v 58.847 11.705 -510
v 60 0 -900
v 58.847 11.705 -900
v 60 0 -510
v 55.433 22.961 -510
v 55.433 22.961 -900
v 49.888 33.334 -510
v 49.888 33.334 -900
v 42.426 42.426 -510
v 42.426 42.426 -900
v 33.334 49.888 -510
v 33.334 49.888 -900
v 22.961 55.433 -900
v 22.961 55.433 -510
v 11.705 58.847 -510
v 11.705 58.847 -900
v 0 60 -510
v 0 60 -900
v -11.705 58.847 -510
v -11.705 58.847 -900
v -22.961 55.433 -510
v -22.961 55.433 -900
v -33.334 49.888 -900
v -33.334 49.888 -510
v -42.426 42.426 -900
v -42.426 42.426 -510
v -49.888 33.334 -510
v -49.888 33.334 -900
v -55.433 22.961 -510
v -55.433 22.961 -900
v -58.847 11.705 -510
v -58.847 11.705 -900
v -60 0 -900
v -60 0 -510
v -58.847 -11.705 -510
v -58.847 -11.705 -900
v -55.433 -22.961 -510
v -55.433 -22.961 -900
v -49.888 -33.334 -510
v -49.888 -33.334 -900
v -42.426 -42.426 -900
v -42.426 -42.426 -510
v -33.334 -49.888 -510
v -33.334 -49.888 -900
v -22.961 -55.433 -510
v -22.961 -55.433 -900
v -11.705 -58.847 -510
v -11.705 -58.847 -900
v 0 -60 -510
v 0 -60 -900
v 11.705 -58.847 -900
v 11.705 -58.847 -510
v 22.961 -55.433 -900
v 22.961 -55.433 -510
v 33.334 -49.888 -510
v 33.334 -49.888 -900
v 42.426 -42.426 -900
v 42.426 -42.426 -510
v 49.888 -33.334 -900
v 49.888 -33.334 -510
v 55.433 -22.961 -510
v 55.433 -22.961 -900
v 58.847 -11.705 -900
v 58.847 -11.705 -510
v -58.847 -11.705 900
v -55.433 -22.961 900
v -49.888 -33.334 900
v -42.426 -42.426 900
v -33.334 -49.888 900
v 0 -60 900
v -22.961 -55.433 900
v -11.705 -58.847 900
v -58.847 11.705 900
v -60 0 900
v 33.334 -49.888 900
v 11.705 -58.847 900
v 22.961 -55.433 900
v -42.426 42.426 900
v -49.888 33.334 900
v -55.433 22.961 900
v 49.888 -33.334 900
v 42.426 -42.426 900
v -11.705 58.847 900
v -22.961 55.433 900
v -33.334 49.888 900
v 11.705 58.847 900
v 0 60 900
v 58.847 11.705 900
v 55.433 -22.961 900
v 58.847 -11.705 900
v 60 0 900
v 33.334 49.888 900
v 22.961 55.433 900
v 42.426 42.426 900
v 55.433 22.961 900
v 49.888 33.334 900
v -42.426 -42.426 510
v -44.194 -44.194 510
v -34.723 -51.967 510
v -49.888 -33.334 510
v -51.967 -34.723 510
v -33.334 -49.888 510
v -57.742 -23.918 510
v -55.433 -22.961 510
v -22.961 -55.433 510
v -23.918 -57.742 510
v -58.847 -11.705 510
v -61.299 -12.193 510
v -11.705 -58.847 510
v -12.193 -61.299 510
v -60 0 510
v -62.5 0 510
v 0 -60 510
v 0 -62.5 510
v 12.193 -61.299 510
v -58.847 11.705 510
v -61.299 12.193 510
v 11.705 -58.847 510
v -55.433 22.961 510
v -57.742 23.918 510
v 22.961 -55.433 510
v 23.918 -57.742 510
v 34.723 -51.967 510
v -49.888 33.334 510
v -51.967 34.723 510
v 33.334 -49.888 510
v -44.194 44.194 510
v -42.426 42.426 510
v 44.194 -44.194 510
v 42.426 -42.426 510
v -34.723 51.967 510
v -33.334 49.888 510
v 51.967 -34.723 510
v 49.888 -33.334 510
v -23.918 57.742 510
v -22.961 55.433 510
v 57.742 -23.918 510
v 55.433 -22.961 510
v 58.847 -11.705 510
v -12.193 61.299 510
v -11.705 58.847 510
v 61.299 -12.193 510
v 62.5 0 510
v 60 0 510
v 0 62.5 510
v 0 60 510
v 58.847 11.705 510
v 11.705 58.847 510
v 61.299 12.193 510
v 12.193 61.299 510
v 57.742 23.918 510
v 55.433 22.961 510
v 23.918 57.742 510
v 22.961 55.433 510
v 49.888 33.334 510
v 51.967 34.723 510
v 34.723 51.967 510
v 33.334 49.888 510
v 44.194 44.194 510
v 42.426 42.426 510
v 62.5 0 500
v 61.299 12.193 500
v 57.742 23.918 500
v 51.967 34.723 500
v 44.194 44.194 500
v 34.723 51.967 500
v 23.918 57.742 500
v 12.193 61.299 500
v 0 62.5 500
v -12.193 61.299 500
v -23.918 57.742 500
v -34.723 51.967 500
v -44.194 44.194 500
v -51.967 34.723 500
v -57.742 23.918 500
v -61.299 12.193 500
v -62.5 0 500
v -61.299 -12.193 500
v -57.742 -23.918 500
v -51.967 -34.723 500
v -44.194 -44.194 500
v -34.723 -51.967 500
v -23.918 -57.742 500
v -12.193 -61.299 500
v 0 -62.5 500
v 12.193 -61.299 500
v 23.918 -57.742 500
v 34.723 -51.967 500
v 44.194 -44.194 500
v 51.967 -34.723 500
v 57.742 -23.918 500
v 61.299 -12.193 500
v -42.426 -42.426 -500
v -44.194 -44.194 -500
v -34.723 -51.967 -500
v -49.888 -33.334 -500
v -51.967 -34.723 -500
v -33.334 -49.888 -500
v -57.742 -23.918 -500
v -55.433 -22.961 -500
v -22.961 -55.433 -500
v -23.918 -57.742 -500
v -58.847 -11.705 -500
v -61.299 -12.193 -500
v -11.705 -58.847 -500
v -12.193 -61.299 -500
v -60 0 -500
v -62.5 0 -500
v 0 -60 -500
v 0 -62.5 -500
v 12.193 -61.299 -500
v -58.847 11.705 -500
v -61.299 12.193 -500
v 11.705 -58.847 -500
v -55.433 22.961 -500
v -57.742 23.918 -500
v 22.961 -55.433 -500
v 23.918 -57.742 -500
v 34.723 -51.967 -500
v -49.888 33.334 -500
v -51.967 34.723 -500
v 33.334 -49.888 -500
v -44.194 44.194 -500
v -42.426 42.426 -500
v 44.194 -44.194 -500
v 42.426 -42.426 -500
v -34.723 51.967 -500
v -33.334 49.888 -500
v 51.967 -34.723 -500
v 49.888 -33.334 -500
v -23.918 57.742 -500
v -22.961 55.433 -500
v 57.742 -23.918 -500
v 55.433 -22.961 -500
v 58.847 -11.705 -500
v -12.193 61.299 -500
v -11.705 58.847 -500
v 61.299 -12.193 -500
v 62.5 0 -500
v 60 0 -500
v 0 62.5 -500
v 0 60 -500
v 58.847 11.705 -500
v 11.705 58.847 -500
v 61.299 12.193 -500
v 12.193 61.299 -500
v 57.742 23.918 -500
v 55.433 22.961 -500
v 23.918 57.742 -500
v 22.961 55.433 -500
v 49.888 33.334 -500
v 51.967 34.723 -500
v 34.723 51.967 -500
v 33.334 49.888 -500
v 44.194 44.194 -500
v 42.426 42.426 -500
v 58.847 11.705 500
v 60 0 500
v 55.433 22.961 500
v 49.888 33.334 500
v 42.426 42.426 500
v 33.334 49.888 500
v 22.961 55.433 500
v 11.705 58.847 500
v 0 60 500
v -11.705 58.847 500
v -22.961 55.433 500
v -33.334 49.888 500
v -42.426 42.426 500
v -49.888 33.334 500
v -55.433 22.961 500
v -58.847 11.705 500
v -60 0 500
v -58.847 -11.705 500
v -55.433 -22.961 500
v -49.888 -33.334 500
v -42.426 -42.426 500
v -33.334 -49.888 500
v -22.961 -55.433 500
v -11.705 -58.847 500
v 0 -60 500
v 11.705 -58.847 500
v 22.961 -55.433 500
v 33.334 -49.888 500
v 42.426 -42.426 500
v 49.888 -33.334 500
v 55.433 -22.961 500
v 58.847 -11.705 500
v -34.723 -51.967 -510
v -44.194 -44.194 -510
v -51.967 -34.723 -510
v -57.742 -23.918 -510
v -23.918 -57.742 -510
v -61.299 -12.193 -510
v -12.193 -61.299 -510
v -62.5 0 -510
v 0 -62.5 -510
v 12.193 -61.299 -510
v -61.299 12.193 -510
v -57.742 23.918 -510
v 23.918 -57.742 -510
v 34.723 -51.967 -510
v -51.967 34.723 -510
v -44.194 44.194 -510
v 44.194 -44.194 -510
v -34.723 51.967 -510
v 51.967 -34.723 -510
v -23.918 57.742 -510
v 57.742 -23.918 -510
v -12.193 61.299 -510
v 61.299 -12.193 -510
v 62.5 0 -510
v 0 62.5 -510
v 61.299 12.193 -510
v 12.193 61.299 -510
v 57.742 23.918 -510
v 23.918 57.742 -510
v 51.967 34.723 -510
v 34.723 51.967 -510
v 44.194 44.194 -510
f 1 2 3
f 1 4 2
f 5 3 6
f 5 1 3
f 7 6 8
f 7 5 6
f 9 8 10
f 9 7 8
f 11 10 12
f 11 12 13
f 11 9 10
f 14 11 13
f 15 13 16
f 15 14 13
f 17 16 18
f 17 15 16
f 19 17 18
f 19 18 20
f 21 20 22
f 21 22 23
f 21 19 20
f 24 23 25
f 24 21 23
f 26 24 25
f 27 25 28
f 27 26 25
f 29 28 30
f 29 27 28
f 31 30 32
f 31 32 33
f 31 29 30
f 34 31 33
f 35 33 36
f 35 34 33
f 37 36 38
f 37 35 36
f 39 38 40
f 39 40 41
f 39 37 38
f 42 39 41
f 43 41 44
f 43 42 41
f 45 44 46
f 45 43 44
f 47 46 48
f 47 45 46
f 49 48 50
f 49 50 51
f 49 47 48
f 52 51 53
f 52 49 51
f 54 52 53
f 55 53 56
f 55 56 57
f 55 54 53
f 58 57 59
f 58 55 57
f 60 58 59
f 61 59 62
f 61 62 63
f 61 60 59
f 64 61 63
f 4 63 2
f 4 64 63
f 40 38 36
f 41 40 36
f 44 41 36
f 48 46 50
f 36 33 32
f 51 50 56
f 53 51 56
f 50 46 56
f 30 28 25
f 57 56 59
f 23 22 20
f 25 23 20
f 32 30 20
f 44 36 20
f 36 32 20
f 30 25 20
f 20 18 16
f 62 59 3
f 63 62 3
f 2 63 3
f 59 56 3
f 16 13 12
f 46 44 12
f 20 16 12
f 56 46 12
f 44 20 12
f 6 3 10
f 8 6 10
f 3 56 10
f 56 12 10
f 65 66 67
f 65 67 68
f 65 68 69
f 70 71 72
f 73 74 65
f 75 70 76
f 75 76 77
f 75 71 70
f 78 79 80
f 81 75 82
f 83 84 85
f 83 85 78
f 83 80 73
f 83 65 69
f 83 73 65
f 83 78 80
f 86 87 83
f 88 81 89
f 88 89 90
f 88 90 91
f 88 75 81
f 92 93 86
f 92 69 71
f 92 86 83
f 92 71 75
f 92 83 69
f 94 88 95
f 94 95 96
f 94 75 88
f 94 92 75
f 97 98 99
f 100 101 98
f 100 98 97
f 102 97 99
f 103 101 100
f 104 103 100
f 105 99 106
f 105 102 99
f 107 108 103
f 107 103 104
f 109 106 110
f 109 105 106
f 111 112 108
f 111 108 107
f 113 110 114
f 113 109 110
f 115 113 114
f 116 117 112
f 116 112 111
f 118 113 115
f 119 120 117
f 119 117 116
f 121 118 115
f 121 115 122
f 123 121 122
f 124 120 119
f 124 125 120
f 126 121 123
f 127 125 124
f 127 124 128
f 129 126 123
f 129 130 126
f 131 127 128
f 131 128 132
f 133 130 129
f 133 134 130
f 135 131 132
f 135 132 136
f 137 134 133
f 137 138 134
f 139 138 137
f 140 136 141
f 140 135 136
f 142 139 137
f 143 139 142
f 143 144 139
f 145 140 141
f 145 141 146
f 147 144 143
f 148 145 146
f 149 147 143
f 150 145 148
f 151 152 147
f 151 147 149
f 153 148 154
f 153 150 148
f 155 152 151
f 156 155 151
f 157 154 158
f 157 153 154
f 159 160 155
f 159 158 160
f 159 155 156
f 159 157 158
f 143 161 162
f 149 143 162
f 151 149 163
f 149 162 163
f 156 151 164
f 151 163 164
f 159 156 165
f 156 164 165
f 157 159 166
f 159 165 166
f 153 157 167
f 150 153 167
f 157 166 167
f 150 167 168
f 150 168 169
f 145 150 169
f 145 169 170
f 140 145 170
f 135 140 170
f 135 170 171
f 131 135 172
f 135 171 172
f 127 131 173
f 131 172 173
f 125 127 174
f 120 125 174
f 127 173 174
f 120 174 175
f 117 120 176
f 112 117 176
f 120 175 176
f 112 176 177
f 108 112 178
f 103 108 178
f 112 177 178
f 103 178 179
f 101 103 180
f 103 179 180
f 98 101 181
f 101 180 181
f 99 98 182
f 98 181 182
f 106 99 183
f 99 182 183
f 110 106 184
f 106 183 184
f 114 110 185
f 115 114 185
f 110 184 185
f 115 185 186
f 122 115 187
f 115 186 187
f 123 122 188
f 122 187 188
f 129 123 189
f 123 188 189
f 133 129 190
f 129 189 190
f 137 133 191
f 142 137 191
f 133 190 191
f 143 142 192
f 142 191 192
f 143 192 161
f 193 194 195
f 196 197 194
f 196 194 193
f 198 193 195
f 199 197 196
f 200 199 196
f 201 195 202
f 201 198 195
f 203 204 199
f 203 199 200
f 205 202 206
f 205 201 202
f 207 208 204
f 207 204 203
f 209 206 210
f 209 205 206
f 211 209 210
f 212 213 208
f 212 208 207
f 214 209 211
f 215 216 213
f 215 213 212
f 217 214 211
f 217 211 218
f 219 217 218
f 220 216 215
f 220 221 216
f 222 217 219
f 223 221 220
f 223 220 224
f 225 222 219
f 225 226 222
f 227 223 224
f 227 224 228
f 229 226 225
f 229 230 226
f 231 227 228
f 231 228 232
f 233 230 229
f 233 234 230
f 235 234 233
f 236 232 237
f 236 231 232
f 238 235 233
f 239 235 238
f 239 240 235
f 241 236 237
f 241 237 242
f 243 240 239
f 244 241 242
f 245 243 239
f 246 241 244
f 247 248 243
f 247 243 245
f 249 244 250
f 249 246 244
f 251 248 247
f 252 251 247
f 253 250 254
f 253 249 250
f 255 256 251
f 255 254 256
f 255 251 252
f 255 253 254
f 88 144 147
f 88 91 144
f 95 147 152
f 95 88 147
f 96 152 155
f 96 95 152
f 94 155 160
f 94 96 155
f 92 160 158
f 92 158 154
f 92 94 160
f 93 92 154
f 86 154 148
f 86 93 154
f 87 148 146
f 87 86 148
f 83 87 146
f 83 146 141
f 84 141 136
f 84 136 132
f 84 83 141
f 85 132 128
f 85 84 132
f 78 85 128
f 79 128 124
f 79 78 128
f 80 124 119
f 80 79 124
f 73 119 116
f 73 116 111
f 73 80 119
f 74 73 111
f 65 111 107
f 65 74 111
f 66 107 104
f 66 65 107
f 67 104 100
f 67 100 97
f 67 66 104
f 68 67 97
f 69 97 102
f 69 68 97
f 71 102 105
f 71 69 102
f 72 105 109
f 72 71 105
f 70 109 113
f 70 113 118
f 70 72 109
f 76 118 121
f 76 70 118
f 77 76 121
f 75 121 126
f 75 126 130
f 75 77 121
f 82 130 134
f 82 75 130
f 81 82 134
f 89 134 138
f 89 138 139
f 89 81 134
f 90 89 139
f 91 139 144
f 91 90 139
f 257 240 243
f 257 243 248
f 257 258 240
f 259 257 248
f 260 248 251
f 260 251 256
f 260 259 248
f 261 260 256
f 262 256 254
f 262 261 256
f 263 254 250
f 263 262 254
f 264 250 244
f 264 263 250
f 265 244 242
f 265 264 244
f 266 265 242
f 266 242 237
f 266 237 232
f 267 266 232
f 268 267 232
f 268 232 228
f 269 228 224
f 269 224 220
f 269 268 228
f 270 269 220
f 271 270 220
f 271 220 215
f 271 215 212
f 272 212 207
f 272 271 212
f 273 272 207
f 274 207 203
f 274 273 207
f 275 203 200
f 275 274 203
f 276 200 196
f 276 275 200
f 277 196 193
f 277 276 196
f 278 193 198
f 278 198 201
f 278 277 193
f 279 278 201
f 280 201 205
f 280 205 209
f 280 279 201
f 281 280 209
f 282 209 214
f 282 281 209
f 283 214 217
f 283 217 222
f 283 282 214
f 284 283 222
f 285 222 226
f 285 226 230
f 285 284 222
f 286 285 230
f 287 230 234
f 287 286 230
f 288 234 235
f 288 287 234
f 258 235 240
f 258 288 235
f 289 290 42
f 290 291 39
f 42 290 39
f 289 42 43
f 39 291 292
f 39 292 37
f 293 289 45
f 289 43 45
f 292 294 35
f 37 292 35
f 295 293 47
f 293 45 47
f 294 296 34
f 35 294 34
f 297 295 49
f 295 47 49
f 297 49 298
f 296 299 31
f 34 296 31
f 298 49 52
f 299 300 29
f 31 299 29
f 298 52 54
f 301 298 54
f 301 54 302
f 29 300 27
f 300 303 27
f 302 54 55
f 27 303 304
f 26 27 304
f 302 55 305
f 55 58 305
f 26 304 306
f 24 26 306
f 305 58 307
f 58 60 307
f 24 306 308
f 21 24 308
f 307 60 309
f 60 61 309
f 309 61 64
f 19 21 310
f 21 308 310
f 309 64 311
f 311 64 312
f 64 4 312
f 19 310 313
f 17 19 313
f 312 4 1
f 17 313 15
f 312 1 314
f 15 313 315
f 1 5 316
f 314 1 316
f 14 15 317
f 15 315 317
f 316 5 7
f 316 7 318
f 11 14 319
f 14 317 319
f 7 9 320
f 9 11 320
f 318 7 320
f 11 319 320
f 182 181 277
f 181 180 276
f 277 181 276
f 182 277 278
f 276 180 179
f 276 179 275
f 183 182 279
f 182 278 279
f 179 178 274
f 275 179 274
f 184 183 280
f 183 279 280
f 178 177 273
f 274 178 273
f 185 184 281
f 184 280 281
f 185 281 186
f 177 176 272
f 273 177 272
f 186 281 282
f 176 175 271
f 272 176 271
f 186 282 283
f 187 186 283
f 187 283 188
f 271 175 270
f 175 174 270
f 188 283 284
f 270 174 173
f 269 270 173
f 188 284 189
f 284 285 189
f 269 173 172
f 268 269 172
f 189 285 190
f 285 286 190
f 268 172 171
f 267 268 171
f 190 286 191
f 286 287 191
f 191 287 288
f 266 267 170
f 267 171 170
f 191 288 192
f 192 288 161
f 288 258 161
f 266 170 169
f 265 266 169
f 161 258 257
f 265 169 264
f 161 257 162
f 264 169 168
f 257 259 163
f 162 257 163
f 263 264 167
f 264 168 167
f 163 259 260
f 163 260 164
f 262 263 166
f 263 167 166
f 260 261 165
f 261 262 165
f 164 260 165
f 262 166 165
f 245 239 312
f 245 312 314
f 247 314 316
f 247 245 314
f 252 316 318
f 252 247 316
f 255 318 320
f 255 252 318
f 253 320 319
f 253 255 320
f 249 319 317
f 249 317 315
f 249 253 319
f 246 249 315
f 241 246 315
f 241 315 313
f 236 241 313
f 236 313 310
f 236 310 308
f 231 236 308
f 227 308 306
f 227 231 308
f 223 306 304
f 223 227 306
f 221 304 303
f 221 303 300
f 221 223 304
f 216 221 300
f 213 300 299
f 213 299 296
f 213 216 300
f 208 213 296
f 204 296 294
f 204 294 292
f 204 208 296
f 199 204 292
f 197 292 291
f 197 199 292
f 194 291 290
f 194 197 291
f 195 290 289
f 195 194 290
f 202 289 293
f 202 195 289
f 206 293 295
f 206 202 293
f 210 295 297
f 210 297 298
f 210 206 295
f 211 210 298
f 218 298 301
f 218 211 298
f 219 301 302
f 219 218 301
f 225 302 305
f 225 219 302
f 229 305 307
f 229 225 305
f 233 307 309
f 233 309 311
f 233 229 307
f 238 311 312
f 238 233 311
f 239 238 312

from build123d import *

# Parameters (mm, degrees)
F0_R     = 60
F1_DEPTH = 900
F4_R     = 62.5
F4_R_2   = 60
F5_DEPTH = 10


# Not quite as in the source:
# - a pattern or mirror of a feature is missing from the dataset's text; its kind, count and spacing are read off the source's solid


with BuildPart() as f1:
    # F0 (on Top) → F1 (new body)
    with BuildSketch(Plane.XY):
        Circle(F0_R)
    extrude(amount=F1_DEPTH)

    # F2: F1 across plane


with BuildPart() as f1_1:
    add(f1.part)
    add(f1.part.mirror(Plane.XY))

    # F4 (on offset) → F5 (join)
    with BuildSketch(Plane.XY.offset(500)):
        Circle(F4_R)
        Circle(F4_R_2, mode=Mode.SUBTRACT)
    f5 = extrude(amount=F5_DEPTH)

    # F5_copies: F5 across plane
    add(f5.mirror(Plane(origin=(0, 0, 0), x_dir=(-1, 0, 0), z_dir=(0, 0, -1))))


solid = f1_1.part
